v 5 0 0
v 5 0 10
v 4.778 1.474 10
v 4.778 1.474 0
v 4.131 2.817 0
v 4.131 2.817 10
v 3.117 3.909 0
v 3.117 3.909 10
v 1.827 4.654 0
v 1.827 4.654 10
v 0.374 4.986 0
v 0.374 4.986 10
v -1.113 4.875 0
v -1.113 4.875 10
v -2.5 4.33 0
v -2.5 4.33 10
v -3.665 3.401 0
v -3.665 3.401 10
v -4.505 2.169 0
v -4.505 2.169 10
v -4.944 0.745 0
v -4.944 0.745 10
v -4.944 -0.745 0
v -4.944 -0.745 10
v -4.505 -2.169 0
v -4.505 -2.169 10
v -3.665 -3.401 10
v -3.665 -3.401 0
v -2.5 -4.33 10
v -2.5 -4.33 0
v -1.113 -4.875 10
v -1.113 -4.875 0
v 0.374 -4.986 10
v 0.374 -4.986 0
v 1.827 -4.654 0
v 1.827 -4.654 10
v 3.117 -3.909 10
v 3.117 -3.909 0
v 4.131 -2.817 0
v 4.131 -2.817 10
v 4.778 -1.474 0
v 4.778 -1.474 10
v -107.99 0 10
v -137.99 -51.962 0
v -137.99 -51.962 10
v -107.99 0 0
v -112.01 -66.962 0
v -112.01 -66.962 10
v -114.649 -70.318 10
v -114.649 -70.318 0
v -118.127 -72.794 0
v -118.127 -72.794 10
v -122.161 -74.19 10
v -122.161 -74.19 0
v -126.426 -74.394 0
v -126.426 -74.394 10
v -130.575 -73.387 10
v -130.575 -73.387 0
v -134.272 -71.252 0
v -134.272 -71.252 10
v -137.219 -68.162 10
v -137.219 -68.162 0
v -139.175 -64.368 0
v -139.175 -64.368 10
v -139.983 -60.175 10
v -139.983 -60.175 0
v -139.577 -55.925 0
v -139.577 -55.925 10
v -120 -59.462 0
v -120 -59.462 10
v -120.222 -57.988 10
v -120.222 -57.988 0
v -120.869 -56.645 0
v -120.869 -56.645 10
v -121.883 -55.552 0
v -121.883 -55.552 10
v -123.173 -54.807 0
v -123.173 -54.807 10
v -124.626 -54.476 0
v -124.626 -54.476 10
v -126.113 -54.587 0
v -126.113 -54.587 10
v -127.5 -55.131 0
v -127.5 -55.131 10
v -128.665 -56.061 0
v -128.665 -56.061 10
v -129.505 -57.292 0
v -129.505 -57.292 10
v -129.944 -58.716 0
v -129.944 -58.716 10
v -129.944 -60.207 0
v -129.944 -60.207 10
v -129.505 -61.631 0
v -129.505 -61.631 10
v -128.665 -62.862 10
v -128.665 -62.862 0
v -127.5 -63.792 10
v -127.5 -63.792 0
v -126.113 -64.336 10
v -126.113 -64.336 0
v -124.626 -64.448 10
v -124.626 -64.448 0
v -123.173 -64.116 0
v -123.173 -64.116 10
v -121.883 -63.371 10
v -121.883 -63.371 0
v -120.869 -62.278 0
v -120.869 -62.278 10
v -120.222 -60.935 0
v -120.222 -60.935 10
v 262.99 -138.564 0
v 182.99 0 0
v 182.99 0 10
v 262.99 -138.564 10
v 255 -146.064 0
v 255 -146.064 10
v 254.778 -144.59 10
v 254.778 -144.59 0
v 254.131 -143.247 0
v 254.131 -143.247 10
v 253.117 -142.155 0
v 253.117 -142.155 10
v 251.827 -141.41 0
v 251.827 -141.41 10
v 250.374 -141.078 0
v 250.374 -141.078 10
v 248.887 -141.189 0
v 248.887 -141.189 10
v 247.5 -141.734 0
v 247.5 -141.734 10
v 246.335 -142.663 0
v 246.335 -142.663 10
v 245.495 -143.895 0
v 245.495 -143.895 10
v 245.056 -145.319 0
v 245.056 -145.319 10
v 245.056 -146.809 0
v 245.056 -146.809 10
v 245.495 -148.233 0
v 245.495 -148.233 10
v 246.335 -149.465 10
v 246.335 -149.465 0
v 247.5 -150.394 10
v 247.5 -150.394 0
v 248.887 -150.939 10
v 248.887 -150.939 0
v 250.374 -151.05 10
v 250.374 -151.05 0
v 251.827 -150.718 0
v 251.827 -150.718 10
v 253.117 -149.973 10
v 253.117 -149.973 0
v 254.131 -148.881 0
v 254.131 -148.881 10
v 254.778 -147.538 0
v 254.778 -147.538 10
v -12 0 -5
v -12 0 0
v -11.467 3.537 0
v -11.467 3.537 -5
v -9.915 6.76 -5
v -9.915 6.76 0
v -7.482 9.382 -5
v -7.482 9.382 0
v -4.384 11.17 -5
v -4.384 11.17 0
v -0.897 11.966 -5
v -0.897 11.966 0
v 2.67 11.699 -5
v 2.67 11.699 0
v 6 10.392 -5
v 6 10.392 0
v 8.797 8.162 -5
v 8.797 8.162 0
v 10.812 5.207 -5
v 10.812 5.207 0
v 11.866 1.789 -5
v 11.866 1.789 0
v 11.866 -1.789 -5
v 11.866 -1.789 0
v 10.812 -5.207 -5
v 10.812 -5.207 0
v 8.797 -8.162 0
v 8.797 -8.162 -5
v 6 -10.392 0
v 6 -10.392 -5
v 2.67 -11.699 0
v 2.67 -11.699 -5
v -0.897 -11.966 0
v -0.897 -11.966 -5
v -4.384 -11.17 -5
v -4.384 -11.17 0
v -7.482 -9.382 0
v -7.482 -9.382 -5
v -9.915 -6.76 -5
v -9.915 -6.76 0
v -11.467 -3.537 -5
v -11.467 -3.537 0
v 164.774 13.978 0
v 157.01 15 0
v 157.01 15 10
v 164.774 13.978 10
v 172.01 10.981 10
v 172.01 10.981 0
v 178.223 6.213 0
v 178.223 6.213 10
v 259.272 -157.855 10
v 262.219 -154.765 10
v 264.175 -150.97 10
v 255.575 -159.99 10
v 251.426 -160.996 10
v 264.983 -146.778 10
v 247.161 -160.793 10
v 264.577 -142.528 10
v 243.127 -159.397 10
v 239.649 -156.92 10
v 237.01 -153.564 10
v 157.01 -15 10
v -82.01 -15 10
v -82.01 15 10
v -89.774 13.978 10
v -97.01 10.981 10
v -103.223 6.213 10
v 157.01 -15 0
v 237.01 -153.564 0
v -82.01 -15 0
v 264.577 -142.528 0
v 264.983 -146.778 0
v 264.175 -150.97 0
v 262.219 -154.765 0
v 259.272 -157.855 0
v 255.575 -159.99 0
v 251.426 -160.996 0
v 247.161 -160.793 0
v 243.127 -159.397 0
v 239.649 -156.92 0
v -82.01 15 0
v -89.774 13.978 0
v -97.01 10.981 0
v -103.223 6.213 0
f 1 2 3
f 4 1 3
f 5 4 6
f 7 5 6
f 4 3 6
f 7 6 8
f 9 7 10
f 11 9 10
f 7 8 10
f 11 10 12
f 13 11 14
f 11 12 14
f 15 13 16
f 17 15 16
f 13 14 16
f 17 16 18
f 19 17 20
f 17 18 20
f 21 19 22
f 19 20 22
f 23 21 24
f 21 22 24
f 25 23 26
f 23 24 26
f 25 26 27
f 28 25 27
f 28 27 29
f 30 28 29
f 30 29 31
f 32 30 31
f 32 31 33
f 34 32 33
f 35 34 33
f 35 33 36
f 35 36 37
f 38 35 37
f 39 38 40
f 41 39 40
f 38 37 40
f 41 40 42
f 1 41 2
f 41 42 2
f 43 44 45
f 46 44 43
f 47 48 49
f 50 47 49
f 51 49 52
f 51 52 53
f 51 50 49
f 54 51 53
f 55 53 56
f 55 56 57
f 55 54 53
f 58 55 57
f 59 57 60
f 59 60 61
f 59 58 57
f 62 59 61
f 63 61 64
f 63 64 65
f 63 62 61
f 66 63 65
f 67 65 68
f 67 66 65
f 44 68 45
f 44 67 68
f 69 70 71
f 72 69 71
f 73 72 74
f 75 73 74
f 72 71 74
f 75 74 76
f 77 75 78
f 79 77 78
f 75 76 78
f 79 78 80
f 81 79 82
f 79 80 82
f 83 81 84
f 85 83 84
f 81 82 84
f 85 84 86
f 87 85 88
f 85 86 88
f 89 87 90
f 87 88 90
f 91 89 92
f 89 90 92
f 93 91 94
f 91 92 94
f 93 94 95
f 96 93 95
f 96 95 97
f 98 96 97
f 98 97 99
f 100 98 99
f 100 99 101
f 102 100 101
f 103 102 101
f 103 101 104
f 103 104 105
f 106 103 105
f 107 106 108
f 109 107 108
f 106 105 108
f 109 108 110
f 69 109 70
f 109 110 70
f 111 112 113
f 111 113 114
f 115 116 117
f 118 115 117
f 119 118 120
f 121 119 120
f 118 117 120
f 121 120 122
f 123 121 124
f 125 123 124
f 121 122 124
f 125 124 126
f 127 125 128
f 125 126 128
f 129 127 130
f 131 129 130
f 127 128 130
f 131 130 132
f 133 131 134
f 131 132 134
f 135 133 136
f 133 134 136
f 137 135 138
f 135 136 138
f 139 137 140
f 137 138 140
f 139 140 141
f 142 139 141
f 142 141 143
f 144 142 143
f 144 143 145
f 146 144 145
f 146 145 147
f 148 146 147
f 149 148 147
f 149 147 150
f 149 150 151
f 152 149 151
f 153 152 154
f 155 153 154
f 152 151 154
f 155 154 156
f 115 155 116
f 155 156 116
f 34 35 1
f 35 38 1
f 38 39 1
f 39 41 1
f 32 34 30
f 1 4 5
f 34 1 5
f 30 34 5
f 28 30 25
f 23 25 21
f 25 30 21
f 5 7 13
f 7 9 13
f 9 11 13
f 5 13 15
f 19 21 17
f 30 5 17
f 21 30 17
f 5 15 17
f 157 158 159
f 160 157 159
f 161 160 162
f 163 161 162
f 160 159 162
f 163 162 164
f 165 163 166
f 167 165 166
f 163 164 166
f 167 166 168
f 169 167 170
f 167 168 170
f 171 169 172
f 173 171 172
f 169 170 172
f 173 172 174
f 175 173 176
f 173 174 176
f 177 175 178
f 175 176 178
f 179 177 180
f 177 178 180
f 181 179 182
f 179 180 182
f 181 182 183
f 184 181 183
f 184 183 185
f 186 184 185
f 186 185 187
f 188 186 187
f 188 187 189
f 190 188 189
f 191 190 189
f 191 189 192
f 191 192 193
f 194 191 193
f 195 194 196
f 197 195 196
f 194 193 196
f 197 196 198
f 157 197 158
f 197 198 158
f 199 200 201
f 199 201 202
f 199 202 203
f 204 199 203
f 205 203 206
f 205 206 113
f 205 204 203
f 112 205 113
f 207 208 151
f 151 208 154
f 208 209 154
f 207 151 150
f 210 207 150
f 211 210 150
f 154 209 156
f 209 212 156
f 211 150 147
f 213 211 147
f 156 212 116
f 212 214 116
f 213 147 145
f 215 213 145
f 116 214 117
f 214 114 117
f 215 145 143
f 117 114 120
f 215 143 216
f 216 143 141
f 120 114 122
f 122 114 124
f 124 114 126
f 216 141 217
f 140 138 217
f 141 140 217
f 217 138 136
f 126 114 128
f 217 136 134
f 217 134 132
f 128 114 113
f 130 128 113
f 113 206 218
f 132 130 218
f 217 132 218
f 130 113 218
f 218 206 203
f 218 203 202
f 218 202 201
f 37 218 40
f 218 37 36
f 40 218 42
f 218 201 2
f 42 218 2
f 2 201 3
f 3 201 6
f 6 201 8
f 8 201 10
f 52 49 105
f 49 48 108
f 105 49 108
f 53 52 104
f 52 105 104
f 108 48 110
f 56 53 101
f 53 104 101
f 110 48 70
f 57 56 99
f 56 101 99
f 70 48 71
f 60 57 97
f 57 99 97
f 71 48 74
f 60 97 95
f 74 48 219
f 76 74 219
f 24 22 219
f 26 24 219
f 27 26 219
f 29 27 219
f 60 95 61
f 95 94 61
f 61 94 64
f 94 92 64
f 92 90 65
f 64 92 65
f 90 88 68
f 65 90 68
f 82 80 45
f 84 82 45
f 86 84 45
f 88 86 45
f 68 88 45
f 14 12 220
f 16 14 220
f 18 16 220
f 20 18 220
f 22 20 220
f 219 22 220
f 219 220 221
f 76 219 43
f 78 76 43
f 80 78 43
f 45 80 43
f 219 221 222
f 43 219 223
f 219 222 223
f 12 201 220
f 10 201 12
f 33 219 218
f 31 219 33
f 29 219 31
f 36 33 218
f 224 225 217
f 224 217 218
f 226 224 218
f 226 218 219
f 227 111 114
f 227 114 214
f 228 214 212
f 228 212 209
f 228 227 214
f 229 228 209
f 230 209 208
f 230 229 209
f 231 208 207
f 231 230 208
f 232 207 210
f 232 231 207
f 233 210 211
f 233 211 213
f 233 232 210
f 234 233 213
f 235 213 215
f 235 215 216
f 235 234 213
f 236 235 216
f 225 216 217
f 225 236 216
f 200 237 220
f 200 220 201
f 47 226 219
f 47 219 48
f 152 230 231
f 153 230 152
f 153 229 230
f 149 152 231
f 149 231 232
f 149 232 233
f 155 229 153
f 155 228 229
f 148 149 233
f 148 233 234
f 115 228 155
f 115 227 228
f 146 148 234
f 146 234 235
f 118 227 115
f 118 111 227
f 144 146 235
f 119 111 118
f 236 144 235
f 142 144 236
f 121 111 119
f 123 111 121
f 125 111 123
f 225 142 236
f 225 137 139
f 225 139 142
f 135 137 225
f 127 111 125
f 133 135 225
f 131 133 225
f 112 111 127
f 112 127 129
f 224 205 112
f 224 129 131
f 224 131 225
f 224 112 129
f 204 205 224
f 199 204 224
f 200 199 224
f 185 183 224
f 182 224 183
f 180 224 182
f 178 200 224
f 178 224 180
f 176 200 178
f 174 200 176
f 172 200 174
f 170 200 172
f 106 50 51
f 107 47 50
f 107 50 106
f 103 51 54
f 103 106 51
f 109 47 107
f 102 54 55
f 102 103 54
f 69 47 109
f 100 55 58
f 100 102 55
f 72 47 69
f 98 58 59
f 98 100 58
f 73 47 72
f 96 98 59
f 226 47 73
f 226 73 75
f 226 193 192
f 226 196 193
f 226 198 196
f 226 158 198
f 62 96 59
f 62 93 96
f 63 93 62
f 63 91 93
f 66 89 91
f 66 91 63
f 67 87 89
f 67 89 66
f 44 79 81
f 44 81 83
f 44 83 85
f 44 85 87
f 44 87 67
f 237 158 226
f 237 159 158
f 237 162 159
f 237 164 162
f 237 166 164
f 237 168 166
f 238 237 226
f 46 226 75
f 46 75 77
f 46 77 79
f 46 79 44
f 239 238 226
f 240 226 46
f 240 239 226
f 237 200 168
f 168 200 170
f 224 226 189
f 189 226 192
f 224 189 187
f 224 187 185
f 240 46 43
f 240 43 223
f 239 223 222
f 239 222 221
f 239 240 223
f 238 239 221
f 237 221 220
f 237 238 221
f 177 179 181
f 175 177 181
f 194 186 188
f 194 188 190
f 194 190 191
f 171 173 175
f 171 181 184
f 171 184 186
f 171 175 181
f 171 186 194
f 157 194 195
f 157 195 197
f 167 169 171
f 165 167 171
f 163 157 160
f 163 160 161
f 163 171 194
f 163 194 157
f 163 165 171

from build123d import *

# Parameters (mm, degrees)
BOSS_EXTRUDE1_DEPTH = 10
SKETCH2_R           = 5
CUT_EXTRUDE1_DEPTH  = 10
SKETCH3_R           = 12
BOSS_EXTRUDE2_DEPTH = 5


with BuildPart() as part:
    # Sketch1 → Boss-Extrude1 (new body)
    with BuildSketch(Plane.XY):
        with BuildLine():
            Line((-82.009618943, -15), (-112.009618943, -66.961524227))
            ThreePointArc((-112.009618943, -66.961524227), (-132.5, -72.451905284), (-137.990381057, -51.961524227))
            Line((-137.990381057, -51.961524227), (-107.990381057, 0))
            ThreePointArc((-107.990381057, 0), (-97.009618943, 10.980762114), (-82.009618943, 15))
            Line((-82.009618943, 15), (0, 15))
            Line((0, 15), (157.009618943, 15))
            ThreePointArc((157.009618943, 15), (172.009618943, 10.980762114), (182.990381057, 0))
            Line((182.990381057, 0), (262.990381057, -138.564064606))
            ThreePointArc((262.990381057, -138.564064606), (257.5, -159.054445662), (237.009618943, -153.564064606))
            Line((237.009618943, -153.564064606), (157.009618943, -15))
            Line((157.009618943, -15), (0, -15))
            Line((0, -15), (-82.009618943, -15))
        make_face()
    extrude(amount=BOSS_EXTRUDE1_DEPTH)

    # Sketch2 → Cut-Extrude1 (cut)
    with BuildSketch(Plane.XY.offset(10)):
        with Locations((-125, -59.461524227)):
            Circle(SKETCH2_R)
        with Locations((250, -146.064064606)):
            Circle(SKETCH2_R)
        Circle(SKETCH2_R)
    extrude(amount=-CUT_EXTRUDE1_DEPTH, mode=Mode.SUBTRACT)

    # Sketch3 → Boss-Extrude2 (add)
    with BuildSketch(Plane(origin=(0, 0, 0), x_dir=(-1, 0, 0), z_dir=(0, 0, -1))):
        Circle(SKETCH3_R)
    extrude(amount=BOSS_EXTRUDE2_DEPTH)


solid = part.part
